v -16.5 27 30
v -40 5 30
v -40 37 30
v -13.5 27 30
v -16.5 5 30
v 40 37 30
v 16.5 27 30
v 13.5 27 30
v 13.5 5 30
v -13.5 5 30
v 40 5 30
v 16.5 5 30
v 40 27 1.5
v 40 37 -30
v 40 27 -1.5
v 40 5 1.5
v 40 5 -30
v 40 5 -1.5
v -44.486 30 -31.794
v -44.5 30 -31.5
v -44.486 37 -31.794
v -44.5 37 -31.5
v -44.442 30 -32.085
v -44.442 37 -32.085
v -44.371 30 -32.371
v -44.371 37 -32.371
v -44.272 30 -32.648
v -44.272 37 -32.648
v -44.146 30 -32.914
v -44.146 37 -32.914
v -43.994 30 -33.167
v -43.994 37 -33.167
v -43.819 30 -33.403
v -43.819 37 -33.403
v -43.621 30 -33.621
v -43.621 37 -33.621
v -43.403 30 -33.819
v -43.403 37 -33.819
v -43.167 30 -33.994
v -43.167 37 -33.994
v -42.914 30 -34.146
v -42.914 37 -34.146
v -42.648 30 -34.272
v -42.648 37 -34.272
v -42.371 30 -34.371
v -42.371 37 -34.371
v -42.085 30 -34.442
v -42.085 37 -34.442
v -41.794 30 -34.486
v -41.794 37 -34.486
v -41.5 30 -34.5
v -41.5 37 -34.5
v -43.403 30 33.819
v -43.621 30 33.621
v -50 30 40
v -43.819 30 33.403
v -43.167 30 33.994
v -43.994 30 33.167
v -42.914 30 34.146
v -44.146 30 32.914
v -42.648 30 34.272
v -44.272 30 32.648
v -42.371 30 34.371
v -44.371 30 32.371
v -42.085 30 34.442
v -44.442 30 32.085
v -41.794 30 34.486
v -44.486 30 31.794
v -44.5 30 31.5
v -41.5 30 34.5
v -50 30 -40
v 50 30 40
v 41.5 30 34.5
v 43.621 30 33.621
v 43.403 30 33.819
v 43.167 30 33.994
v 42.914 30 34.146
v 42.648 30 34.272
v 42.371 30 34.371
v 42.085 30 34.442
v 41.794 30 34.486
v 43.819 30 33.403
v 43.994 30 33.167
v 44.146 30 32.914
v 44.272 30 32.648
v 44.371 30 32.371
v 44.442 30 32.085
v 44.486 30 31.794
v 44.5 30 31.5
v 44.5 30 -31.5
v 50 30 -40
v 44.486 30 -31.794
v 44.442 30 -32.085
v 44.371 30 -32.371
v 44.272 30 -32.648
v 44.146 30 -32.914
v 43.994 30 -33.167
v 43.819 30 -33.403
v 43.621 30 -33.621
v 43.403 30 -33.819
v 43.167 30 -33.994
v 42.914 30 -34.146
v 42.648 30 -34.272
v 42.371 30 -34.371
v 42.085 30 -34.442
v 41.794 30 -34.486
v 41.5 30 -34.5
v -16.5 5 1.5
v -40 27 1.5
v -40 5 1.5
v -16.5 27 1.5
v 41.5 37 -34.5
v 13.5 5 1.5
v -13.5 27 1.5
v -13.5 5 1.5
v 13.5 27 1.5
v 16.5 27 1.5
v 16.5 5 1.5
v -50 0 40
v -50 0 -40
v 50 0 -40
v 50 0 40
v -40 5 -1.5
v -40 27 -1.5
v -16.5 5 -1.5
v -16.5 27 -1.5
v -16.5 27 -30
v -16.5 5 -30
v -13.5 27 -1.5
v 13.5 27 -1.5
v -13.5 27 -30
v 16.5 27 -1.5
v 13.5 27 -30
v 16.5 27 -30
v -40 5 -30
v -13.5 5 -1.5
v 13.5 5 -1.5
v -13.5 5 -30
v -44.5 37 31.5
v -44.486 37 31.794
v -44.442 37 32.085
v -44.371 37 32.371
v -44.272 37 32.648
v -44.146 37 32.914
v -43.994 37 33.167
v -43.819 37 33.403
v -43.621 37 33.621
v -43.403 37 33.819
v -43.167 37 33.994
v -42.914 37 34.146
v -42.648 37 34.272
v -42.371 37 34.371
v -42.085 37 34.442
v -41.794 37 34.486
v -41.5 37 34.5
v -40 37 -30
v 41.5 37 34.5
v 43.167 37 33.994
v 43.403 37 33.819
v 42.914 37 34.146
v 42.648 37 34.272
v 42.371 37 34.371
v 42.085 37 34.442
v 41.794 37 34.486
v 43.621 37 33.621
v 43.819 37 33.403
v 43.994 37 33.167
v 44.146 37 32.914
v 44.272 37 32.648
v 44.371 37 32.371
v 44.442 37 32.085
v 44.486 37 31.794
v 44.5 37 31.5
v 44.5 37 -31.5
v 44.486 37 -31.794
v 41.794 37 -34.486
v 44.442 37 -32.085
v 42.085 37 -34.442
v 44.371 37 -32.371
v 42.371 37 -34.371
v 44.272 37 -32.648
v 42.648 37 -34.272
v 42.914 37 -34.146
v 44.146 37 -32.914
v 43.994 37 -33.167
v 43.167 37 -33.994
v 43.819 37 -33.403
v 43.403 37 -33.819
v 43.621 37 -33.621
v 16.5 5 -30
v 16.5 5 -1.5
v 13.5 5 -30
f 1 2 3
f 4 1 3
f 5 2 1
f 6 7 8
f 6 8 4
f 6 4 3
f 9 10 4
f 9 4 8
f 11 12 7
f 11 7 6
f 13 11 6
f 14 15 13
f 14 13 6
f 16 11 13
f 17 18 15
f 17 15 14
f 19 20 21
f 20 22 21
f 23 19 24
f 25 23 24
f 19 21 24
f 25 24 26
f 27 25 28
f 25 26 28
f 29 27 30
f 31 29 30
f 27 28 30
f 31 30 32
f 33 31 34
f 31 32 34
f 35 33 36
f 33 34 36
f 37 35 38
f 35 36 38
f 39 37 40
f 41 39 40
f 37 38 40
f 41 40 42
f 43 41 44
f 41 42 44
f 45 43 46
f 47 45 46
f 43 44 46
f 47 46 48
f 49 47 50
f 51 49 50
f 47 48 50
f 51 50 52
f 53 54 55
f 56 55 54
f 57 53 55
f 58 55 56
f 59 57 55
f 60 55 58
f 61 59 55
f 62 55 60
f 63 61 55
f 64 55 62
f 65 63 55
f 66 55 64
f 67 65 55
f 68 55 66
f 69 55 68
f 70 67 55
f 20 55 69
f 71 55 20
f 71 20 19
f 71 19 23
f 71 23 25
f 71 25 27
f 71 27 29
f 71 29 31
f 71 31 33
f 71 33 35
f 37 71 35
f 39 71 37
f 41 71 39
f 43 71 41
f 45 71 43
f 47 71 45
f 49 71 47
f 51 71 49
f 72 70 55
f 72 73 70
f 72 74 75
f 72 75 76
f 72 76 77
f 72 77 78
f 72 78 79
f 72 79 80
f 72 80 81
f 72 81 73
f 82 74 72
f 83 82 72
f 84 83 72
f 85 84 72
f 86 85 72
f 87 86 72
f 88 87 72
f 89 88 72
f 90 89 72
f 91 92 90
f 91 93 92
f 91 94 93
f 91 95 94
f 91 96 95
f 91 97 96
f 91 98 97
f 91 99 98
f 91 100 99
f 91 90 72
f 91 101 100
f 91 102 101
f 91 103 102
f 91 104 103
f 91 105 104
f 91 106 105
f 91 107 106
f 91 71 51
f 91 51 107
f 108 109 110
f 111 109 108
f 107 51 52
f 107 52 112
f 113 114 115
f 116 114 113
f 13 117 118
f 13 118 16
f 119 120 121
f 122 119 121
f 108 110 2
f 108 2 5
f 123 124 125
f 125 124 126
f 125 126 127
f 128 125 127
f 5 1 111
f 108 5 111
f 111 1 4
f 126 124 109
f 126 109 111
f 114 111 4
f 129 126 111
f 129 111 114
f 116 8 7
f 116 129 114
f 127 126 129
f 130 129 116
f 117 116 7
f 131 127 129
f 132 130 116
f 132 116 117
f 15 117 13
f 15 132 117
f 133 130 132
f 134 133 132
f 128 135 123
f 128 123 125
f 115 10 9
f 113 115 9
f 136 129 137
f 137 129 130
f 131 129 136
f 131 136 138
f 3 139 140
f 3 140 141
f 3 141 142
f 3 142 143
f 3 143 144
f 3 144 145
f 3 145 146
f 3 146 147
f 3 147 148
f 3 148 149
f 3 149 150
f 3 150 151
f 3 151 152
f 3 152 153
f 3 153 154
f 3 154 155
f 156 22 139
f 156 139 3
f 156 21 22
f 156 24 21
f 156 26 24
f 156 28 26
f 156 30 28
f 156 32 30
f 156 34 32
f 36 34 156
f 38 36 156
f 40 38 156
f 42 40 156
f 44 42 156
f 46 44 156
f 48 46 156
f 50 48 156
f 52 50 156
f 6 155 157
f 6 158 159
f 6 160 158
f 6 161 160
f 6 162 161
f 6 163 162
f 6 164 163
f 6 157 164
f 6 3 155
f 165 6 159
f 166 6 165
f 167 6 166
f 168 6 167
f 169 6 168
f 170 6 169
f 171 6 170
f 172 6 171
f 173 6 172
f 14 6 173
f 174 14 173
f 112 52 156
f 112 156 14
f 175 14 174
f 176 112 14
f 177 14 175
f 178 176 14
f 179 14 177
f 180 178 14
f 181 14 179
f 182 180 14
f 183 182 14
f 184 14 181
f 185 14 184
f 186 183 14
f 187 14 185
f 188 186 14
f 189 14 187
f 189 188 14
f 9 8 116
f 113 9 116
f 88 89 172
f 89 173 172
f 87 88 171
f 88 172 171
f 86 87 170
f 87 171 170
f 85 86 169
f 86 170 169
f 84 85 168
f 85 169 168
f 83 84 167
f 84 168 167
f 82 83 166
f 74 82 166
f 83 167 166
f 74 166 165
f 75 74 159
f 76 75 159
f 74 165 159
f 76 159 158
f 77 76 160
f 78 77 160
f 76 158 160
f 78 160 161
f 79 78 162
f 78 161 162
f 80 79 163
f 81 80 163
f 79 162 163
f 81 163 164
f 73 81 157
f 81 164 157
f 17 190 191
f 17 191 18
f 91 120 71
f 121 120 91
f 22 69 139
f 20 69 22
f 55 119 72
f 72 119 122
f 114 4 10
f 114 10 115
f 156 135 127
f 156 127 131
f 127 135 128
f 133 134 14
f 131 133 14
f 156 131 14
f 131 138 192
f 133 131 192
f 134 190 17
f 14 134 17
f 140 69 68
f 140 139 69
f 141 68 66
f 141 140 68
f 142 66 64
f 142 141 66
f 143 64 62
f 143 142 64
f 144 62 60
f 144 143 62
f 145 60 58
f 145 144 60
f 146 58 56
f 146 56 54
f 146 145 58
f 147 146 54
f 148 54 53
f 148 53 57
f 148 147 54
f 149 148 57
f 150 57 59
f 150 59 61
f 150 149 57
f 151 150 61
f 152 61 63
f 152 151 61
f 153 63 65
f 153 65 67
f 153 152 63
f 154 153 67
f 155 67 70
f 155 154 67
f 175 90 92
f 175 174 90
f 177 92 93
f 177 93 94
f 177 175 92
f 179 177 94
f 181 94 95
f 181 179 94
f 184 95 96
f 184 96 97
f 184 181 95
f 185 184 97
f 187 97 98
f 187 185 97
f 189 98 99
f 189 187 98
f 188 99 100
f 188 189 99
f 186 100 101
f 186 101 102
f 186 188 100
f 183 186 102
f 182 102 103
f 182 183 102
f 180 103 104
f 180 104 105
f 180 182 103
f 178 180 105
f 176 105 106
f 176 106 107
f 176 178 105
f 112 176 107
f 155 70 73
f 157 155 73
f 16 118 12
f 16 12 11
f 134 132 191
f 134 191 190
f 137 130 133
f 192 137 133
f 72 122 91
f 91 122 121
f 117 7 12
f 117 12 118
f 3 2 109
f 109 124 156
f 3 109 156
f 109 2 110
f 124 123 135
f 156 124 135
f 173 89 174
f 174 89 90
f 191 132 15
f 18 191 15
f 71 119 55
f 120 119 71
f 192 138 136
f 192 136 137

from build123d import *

# Parameters (mm, degrees)
SKETCH1_W           = 100
SKETCH1_H           = 80
BOSS_EXTRUDE1_DEPTH = 30
SKETCH2_W           = 23.5
SKETCH2_H           = 28.5
SKETCH2_W_2         = 27
CUT_EXTRUDE1_DEPTH  = 25
SKETCH3_W           = 80
SKETCH3_H           = 60
CUT_EXTRUDE2_DEPTH  = 3
SKETCH5_W           = 89
SKETCH5_H           = 69
SKETCH5_W_2         = 80
SKETCH5_H_2         = 60
BOSS_EXTRUDE2_DEPTH = 7
FILLET1_R           = 3


with BuildPart() as part:
    # Sketch1 → Boss-Extrude1 (new body)
    with BuildSketch(Plane(origin=(0, 0, 0), x_dir=(1, 0, 0), z_dir=(0, 1, 0))):
        Rectangle(SKETCH1_W, SKETCH1_H)
    extrude(amount=BOSS_EXTRUDE1_DEPTH)

    # Sketch2 → Cut-Extrude1 (cut)
    with BuildSketch(Plane(origin=(0, 30, 0), x_dir=(1, 0, 0), z_dir=(0, 1, 0))):
        with Locations((-28.25, 15.75)):
            Rectangle(SKETCH2_W, SKETCH2_H)
        with Locations((0, 15.75)):
            Rectangle(SKETCH2_W_2, SKETCH2_H)
        with Locations((28.25, 15.75)):
            Rectangle(SKETCH2_W, SKETCH2_H)
        with Locations((28.25, -15.75)):
            Rectangle(SKETCH2_W, SKETCH2_H)
        with Locations((0, -15.75)):
            Rectangle(SKETCH2_W_2, SKETCH2_H)
        with Locations((-28.25, -15.75)):
            Rectangle(SKETCH2_W, SKETCH2_H)
    extrude(amount=-CUT_EXTRUDE1_DEPTH, mode=Mode.SUBTRACT)

    # Sketch3 → Cut-Extrude2 (cut)
    with BuildSketch(Plane(origin=(0, 30, 0), x_dir=(1, 0, 0), z_dir=(0, 1, 0))):
        Rectangle(SKETCH3_W, SKETCH3_H)
    extrude(amount=-CUT_EXTRUDE2_DEPTH, mode=Mode.SUBTRACT)

    # Sketch5 → Boss-Extrude2 (add)
    with BuildSketch(Plane(origin=(0, 30, 0), x_dir=(1, 0, 0), z_dir=(0, 1, 0))):
        Rectangle(SKETCH5_W, SKETCH5_H)
        Rectangle(SKETCH5_W_2, SKETCH5_H_2, mode=Mode.SUBTRACT)
    extrude(amount=BOSS_EXTRUDE2_DEPTH)

    # Fillet1
    fillet1_edges = [part.edges().sort_by_distance(p)[0] for p in [
        (-44.5, 33.5, -34.5),
        (-44.5, 33.5, 34.5),
        (44.5, 33.5, 34.5),
        (44.5, 33.5, -34.5),
    ]]
    fillet(fillet1_edges, radius=FILLET1_R)


solid = part.part
